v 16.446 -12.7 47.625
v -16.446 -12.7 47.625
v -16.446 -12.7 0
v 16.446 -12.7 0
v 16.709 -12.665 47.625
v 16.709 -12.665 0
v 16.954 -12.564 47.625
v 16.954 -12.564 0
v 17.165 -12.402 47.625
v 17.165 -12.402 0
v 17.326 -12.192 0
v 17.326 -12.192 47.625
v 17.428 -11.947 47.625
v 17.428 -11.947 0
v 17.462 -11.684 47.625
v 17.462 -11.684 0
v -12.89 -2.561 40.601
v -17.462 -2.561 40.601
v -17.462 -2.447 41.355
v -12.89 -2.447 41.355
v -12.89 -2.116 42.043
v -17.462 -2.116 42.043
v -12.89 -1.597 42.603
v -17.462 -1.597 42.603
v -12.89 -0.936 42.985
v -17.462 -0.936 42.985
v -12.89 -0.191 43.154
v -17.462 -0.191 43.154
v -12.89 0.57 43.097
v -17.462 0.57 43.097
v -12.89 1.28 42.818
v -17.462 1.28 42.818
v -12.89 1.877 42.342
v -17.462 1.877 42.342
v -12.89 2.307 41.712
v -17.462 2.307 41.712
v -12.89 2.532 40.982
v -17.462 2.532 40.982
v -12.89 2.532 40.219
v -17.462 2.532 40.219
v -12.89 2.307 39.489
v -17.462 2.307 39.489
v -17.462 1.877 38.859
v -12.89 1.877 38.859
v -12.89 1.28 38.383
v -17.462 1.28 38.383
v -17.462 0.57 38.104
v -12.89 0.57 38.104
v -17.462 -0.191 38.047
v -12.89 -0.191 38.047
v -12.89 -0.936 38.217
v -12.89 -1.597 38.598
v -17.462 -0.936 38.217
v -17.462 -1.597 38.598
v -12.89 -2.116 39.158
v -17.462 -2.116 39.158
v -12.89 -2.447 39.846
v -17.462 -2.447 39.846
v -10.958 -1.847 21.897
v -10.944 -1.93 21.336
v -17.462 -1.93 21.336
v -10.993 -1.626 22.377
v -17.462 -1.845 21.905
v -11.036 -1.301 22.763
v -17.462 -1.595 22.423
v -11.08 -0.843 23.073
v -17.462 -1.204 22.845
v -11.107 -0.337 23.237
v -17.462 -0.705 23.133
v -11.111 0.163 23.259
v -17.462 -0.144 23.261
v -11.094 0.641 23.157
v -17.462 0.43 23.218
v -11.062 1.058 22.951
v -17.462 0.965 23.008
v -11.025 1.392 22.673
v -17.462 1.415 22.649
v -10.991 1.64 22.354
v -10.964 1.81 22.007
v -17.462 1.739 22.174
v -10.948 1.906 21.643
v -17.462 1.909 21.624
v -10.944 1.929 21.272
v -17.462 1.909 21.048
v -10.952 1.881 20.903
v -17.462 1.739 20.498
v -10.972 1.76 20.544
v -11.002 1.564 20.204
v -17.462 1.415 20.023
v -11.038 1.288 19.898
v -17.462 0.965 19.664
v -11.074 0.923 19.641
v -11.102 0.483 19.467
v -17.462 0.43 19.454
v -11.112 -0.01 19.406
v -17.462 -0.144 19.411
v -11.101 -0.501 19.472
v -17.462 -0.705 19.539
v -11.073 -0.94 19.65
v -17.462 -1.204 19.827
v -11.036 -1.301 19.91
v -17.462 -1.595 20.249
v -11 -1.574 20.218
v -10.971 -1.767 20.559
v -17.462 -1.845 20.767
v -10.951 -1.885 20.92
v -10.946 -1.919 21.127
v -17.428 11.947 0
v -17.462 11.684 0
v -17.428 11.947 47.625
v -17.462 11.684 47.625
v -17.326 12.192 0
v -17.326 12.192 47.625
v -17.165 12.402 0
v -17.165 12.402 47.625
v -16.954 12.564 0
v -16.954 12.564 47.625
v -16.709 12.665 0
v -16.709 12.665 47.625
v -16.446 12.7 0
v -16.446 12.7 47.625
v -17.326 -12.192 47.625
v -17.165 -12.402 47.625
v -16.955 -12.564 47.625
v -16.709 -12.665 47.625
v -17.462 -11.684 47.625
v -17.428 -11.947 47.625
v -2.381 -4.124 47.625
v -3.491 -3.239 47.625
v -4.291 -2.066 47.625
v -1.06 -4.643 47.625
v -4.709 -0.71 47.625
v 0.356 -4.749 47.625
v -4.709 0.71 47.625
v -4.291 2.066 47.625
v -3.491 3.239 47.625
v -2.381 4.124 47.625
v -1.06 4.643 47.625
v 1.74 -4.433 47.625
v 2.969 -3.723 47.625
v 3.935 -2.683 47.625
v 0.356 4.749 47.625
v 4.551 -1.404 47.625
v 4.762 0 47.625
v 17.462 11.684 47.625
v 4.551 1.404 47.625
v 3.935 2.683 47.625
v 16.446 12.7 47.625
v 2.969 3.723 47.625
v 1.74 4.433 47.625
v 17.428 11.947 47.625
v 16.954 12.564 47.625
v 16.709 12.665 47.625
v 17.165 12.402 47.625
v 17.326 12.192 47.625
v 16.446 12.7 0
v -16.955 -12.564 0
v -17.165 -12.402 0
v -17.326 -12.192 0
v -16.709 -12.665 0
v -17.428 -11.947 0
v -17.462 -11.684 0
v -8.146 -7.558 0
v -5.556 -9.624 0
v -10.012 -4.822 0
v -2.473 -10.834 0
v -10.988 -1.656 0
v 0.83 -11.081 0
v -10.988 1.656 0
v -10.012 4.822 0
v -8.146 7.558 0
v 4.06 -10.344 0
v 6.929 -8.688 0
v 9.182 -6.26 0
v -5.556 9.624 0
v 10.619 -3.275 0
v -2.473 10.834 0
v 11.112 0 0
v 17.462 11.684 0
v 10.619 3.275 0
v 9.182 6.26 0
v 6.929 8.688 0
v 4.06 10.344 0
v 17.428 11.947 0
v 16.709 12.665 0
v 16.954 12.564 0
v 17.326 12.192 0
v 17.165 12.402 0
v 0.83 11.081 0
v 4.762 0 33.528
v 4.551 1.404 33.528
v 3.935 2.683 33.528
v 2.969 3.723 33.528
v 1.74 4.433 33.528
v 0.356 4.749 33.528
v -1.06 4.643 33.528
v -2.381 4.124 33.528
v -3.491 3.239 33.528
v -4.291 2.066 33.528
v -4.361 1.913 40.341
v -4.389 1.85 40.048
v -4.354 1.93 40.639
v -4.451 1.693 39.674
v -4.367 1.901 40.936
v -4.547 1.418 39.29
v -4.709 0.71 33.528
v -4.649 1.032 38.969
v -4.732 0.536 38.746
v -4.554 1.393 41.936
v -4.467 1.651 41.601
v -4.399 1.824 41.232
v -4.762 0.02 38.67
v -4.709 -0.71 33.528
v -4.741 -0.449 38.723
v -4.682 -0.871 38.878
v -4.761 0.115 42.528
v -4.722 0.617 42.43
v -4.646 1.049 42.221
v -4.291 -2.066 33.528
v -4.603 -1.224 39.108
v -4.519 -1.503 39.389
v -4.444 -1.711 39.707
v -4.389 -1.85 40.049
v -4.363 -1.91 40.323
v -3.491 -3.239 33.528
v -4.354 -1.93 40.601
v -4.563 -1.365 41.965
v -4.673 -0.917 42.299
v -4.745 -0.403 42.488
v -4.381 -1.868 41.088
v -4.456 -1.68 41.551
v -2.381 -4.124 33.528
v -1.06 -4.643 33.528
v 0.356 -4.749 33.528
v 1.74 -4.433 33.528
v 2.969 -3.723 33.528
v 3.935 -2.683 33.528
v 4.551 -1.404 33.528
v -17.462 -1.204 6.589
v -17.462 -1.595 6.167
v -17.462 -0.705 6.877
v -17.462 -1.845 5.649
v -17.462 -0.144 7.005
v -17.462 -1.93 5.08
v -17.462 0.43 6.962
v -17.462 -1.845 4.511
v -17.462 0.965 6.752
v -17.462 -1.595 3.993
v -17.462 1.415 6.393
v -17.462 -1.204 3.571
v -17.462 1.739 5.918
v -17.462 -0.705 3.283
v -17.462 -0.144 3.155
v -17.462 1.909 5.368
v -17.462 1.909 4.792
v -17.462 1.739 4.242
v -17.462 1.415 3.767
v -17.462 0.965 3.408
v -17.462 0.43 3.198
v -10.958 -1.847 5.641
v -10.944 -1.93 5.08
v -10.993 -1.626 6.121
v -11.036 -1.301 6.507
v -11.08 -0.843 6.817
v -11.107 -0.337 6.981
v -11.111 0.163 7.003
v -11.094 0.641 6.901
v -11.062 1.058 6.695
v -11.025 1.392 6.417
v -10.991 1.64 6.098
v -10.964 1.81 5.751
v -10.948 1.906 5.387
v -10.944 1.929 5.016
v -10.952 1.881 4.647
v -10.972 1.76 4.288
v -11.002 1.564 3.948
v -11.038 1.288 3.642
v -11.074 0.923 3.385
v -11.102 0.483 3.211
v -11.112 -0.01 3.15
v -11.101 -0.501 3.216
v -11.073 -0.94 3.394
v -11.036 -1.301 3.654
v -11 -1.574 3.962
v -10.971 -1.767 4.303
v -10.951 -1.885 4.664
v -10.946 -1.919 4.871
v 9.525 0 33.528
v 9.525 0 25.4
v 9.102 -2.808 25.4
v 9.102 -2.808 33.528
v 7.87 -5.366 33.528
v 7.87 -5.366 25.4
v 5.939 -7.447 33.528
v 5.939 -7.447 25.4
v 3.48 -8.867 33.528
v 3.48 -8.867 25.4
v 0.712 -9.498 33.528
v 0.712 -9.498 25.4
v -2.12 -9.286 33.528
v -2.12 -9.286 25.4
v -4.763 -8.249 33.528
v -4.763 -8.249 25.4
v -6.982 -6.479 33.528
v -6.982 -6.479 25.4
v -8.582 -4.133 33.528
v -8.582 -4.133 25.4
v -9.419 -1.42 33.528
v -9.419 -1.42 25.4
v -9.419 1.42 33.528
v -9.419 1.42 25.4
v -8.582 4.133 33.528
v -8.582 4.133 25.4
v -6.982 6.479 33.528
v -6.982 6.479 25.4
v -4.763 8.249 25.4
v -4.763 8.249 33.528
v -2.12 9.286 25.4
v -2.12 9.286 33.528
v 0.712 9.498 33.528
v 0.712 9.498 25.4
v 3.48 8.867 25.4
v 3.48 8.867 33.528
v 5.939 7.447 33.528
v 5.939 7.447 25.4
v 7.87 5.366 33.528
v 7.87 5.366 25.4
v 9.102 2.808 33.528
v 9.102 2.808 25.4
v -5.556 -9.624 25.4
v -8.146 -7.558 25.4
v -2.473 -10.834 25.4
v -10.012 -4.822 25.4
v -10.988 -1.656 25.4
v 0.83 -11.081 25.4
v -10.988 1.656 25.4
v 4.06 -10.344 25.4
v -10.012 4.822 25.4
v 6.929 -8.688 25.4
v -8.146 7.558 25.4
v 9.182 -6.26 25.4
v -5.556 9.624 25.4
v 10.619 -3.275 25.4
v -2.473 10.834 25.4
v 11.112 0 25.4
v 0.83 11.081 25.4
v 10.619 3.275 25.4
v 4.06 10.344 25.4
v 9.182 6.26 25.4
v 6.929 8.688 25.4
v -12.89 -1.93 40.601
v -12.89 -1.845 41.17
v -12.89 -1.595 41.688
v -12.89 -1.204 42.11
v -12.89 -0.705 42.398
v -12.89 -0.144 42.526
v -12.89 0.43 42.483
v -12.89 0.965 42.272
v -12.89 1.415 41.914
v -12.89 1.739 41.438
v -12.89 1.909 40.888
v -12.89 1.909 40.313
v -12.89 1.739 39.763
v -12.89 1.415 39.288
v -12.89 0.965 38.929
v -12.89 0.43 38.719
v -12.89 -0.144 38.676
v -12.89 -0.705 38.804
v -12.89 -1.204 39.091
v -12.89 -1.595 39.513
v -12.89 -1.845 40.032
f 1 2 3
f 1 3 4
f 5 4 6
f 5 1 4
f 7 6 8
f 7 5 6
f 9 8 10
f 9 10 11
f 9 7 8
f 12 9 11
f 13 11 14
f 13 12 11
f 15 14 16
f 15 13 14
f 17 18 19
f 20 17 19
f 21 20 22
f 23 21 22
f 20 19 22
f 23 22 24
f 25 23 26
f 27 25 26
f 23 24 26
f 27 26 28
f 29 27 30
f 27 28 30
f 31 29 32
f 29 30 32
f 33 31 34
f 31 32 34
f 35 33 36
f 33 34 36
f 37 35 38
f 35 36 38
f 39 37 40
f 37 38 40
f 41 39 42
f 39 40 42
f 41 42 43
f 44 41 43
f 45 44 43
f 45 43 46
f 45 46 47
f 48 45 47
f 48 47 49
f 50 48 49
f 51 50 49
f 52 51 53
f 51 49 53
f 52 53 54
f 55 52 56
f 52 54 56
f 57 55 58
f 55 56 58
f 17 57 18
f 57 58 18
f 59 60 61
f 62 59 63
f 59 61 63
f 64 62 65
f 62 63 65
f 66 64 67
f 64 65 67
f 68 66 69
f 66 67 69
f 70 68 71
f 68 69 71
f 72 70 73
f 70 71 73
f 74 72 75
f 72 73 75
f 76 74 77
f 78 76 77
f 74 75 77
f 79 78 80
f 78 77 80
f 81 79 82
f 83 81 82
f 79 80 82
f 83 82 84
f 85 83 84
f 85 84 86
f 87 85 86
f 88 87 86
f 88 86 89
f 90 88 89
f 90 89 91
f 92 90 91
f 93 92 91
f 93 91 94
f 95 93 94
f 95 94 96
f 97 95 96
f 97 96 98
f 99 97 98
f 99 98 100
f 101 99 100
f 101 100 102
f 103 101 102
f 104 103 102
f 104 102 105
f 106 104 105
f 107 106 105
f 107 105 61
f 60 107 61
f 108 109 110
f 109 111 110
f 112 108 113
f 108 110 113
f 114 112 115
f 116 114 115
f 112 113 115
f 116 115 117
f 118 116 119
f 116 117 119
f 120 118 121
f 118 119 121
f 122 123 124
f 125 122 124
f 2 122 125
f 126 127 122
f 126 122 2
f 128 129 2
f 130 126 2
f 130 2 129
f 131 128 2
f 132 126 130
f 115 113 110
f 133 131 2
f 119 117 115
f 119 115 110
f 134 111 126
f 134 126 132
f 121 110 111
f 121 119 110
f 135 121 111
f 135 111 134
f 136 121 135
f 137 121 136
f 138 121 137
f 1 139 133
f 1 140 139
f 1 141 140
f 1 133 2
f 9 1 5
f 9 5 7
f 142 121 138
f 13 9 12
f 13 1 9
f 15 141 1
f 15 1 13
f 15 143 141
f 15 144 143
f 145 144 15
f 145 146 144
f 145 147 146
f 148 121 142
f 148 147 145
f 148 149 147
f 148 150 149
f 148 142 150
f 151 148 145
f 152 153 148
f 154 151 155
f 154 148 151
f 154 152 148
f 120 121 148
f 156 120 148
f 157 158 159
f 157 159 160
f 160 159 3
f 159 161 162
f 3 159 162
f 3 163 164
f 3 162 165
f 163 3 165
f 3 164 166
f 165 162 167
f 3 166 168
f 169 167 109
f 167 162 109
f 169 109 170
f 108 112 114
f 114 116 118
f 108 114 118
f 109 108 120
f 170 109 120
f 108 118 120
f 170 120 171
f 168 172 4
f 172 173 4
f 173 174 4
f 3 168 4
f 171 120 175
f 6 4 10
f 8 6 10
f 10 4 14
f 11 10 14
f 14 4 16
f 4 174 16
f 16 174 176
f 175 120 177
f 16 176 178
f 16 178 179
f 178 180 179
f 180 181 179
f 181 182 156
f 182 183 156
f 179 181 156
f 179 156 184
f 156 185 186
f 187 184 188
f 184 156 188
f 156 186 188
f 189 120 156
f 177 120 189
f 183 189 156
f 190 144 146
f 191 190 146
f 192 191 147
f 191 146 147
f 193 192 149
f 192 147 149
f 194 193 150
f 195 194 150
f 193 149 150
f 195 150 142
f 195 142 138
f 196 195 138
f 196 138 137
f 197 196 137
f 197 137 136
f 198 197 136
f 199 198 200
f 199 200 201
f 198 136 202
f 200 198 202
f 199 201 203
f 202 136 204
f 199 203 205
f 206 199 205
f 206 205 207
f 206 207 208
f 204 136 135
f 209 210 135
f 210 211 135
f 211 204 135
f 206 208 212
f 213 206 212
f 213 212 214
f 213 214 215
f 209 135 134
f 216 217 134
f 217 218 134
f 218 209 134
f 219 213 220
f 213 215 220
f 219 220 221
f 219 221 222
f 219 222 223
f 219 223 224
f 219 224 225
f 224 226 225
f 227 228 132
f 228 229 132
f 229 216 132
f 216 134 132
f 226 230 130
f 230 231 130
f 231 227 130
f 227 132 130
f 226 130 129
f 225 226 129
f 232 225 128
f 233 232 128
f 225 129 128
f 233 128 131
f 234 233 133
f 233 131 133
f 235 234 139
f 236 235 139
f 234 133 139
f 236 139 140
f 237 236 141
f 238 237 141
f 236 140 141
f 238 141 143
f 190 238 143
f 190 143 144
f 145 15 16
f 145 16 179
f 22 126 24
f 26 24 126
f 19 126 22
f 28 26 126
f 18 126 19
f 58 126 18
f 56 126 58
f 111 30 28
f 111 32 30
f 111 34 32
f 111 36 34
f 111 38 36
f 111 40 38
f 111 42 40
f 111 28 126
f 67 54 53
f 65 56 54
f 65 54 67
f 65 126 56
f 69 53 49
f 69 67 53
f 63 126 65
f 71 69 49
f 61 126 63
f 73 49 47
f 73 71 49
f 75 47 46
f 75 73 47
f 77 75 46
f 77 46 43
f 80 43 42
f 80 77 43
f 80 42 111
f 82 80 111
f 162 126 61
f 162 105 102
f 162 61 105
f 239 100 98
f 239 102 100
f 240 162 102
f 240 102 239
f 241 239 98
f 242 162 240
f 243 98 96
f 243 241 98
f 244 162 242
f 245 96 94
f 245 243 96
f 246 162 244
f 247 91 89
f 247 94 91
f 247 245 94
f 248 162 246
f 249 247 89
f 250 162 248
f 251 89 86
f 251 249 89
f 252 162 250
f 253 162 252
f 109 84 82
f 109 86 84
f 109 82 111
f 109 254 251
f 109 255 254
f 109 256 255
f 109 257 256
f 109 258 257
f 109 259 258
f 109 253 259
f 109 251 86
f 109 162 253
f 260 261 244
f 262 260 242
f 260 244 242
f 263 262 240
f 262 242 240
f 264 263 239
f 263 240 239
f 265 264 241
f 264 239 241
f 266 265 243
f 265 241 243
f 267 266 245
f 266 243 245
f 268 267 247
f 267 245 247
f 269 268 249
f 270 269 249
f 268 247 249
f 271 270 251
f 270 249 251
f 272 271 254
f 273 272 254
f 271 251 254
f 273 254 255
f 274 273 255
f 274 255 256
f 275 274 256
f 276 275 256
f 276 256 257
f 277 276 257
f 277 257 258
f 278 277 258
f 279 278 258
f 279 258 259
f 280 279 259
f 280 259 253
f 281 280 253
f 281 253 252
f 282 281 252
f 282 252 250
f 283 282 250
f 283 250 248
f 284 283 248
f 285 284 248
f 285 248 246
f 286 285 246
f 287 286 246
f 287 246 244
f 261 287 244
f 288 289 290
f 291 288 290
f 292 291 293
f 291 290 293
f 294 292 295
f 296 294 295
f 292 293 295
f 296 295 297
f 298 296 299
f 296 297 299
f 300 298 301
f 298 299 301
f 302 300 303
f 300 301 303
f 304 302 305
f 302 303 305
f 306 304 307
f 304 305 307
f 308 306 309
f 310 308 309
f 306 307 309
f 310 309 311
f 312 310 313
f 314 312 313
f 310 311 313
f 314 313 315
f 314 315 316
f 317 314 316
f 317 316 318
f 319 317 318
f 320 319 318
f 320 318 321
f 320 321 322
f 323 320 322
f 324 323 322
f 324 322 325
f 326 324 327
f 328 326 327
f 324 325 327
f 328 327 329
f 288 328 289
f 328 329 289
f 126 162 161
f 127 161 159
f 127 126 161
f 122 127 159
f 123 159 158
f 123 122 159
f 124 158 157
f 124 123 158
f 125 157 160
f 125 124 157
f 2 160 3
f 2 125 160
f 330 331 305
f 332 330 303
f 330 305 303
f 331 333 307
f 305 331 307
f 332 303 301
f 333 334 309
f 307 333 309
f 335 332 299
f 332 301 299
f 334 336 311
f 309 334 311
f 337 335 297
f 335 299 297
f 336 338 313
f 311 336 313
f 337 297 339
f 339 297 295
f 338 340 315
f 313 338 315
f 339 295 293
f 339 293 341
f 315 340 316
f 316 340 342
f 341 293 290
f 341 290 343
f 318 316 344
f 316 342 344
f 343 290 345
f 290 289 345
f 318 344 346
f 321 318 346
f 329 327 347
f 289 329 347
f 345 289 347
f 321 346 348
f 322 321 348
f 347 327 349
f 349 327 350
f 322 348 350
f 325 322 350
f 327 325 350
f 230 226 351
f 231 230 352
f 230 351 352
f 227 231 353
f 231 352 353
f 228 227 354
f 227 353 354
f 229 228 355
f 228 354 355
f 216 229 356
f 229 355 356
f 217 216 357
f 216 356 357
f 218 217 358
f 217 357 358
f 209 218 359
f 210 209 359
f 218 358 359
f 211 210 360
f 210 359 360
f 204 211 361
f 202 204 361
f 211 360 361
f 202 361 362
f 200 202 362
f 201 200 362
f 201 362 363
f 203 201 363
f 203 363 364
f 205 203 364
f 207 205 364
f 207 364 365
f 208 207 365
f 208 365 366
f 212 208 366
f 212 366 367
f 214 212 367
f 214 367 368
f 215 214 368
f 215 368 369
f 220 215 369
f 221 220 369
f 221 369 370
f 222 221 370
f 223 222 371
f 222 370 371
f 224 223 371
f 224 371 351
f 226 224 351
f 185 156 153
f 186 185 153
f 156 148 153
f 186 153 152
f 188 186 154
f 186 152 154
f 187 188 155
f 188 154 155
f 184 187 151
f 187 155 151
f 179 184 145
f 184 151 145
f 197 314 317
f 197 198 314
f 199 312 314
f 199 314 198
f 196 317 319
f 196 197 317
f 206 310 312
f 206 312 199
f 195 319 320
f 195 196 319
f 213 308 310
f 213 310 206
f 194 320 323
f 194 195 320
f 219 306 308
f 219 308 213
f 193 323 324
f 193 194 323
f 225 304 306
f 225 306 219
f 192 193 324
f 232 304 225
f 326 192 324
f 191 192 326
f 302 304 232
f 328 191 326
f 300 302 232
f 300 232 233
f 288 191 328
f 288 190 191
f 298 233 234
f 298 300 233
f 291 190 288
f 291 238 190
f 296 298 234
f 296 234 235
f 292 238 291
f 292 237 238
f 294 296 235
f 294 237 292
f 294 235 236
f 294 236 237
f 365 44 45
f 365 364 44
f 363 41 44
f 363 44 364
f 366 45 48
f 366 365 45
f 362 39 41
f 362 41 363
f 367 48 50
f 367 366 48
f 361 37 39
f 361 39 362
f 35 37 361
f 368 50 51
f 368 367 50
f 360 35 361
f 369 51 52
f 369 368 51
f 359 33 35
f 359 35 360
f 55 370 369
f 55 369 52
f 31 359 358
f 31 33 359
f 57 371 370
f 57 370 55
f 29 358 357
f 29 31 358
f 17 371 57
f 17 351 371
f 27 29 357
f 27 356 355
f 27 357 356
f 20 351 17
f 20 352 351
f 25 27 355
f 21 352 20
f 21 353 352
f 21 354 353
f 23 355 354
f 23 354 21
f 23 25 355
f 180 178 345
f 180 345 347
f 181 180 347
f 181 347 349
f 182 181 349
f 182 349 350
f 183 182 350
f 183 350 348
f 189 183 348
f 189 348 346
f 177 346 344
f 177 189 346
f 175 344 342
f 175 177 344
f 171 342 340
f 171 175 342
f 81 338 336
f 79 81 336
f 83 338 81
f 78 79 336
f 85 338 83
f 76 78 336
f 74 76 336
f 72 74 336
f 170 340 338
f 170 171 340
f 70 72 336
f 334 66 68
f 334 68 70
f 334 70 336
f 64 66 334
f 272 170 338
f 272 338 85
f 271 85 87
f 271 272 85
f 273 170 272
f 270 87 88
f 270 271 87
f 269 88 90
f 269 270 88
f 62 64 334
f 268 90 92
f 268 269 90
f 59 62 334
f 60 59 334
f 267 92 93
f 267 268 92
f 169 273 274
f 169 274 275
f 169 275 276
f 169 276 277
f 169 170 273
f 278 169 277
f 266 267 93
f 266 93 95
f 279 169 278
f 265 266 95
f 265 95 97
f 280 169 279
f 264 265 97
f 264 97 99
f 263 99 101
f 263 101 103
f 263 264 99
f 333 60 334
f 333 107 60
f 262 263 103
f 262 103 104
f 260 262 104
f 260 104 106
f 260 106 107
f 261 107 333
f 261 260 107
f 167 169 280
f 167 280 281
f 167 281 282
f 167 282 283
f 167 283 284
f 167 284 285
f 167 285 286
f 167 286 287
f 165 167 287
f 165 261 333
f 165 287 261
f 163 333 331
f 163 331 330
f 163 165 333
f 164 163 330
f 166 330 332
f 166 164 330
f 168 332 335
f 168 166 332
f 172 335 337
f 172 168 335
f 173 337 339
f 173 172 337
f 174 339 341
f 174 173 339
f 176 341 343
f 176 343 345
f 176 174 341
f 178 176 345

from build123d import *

# Parameters (mm, degrees)
F0_W      = 34.925
F0_H      = 25.4
F1_DEPTH  = 47.625
F2_R      = 11.1125
F3_DEPTH  = 25.4
F4_R      = 9.525
F5_DEPTH  = 8.128
F6_R      = 4.7625
F7_DEPTH  = 25.4
F8_R      = 1.9304
F9_DEPTH  = 16.77604
F10_R     = 1.016
F11_R     = 2.560992
F12_DEPTH = 4.572


with BuildPart() as f1:
    # F0 (on Top) → F1 (new body)
    with BuildSketch(Plane.XY):
        Rectangle(F0_W, F0_H)
    extrude(amount=F1_DEPTH)

    # F2 (on Top) → F3 (cut)
    with BuildSketch(Plane.XY):
        Circle(F2_R)
    extrude(amount=F3_DEPTH, mode=Mode.SUBTRACT)

    # F4 (on face) → F5 (cut)
    with BuildSketch(Plane(origin=(0, 0, 25.4), x_dir=(1, 0, 0), z_dir=(0, 0, -1))):
        Circle(F4_R)
    extrude(amount=-F5_DEPTH, mode=Mode.SUBTRACT)

    # F6 (on face) → F7 (cut)
    with BuildSketch(Plane.XY.offset(47.625)):
        Circle(F6_R)
    extrude(amount=-F7_DEPTH, mode=Mode.SUBTRACT)

    # F8 (on face) → F9 (cut)
    with BuildSketch(Plane(origin=(-17.4625, 0, 0), x_dir=(0, -1, 0), z_dir=(-1, 0, 0))):
        with Locations((0, 21.336)):
            Circle(F8_R)
        with Locations((0, 5.08)):
            Circle(F8_R)
        with Locations((0, 40.600542)):
            Circle(F8_R)
    extrude(amount=-F9_DEPTH, mode=Mode.SUBTRACT)

    # F10
    f10_edges = [f1.edges().sort_by_distance(p)[0] for p in [
        (-17.4625, -12.7, 23.8125),
        (17.4625, -12.7, 23.8125),
        (-17.4625, 12.7, 23.8125),
        (17.4625, 12.7, 23.8125),
    ]]
    fillet(f10_edges, radius=F10_R)

    # F11 (on face) → F12 (cut)
    with BuildSketch(Plane(origin=(-17.4625, 0, 0), x_dir=(0, -1, 0), z_dir=(-1, 0, 0))):
        with Locations((0, 40.600542)):
            Circle(F11_R)
    extrude(amount=-F12_DEPTH, mode=Mode.SUBTRACT)


solid = f1.part
